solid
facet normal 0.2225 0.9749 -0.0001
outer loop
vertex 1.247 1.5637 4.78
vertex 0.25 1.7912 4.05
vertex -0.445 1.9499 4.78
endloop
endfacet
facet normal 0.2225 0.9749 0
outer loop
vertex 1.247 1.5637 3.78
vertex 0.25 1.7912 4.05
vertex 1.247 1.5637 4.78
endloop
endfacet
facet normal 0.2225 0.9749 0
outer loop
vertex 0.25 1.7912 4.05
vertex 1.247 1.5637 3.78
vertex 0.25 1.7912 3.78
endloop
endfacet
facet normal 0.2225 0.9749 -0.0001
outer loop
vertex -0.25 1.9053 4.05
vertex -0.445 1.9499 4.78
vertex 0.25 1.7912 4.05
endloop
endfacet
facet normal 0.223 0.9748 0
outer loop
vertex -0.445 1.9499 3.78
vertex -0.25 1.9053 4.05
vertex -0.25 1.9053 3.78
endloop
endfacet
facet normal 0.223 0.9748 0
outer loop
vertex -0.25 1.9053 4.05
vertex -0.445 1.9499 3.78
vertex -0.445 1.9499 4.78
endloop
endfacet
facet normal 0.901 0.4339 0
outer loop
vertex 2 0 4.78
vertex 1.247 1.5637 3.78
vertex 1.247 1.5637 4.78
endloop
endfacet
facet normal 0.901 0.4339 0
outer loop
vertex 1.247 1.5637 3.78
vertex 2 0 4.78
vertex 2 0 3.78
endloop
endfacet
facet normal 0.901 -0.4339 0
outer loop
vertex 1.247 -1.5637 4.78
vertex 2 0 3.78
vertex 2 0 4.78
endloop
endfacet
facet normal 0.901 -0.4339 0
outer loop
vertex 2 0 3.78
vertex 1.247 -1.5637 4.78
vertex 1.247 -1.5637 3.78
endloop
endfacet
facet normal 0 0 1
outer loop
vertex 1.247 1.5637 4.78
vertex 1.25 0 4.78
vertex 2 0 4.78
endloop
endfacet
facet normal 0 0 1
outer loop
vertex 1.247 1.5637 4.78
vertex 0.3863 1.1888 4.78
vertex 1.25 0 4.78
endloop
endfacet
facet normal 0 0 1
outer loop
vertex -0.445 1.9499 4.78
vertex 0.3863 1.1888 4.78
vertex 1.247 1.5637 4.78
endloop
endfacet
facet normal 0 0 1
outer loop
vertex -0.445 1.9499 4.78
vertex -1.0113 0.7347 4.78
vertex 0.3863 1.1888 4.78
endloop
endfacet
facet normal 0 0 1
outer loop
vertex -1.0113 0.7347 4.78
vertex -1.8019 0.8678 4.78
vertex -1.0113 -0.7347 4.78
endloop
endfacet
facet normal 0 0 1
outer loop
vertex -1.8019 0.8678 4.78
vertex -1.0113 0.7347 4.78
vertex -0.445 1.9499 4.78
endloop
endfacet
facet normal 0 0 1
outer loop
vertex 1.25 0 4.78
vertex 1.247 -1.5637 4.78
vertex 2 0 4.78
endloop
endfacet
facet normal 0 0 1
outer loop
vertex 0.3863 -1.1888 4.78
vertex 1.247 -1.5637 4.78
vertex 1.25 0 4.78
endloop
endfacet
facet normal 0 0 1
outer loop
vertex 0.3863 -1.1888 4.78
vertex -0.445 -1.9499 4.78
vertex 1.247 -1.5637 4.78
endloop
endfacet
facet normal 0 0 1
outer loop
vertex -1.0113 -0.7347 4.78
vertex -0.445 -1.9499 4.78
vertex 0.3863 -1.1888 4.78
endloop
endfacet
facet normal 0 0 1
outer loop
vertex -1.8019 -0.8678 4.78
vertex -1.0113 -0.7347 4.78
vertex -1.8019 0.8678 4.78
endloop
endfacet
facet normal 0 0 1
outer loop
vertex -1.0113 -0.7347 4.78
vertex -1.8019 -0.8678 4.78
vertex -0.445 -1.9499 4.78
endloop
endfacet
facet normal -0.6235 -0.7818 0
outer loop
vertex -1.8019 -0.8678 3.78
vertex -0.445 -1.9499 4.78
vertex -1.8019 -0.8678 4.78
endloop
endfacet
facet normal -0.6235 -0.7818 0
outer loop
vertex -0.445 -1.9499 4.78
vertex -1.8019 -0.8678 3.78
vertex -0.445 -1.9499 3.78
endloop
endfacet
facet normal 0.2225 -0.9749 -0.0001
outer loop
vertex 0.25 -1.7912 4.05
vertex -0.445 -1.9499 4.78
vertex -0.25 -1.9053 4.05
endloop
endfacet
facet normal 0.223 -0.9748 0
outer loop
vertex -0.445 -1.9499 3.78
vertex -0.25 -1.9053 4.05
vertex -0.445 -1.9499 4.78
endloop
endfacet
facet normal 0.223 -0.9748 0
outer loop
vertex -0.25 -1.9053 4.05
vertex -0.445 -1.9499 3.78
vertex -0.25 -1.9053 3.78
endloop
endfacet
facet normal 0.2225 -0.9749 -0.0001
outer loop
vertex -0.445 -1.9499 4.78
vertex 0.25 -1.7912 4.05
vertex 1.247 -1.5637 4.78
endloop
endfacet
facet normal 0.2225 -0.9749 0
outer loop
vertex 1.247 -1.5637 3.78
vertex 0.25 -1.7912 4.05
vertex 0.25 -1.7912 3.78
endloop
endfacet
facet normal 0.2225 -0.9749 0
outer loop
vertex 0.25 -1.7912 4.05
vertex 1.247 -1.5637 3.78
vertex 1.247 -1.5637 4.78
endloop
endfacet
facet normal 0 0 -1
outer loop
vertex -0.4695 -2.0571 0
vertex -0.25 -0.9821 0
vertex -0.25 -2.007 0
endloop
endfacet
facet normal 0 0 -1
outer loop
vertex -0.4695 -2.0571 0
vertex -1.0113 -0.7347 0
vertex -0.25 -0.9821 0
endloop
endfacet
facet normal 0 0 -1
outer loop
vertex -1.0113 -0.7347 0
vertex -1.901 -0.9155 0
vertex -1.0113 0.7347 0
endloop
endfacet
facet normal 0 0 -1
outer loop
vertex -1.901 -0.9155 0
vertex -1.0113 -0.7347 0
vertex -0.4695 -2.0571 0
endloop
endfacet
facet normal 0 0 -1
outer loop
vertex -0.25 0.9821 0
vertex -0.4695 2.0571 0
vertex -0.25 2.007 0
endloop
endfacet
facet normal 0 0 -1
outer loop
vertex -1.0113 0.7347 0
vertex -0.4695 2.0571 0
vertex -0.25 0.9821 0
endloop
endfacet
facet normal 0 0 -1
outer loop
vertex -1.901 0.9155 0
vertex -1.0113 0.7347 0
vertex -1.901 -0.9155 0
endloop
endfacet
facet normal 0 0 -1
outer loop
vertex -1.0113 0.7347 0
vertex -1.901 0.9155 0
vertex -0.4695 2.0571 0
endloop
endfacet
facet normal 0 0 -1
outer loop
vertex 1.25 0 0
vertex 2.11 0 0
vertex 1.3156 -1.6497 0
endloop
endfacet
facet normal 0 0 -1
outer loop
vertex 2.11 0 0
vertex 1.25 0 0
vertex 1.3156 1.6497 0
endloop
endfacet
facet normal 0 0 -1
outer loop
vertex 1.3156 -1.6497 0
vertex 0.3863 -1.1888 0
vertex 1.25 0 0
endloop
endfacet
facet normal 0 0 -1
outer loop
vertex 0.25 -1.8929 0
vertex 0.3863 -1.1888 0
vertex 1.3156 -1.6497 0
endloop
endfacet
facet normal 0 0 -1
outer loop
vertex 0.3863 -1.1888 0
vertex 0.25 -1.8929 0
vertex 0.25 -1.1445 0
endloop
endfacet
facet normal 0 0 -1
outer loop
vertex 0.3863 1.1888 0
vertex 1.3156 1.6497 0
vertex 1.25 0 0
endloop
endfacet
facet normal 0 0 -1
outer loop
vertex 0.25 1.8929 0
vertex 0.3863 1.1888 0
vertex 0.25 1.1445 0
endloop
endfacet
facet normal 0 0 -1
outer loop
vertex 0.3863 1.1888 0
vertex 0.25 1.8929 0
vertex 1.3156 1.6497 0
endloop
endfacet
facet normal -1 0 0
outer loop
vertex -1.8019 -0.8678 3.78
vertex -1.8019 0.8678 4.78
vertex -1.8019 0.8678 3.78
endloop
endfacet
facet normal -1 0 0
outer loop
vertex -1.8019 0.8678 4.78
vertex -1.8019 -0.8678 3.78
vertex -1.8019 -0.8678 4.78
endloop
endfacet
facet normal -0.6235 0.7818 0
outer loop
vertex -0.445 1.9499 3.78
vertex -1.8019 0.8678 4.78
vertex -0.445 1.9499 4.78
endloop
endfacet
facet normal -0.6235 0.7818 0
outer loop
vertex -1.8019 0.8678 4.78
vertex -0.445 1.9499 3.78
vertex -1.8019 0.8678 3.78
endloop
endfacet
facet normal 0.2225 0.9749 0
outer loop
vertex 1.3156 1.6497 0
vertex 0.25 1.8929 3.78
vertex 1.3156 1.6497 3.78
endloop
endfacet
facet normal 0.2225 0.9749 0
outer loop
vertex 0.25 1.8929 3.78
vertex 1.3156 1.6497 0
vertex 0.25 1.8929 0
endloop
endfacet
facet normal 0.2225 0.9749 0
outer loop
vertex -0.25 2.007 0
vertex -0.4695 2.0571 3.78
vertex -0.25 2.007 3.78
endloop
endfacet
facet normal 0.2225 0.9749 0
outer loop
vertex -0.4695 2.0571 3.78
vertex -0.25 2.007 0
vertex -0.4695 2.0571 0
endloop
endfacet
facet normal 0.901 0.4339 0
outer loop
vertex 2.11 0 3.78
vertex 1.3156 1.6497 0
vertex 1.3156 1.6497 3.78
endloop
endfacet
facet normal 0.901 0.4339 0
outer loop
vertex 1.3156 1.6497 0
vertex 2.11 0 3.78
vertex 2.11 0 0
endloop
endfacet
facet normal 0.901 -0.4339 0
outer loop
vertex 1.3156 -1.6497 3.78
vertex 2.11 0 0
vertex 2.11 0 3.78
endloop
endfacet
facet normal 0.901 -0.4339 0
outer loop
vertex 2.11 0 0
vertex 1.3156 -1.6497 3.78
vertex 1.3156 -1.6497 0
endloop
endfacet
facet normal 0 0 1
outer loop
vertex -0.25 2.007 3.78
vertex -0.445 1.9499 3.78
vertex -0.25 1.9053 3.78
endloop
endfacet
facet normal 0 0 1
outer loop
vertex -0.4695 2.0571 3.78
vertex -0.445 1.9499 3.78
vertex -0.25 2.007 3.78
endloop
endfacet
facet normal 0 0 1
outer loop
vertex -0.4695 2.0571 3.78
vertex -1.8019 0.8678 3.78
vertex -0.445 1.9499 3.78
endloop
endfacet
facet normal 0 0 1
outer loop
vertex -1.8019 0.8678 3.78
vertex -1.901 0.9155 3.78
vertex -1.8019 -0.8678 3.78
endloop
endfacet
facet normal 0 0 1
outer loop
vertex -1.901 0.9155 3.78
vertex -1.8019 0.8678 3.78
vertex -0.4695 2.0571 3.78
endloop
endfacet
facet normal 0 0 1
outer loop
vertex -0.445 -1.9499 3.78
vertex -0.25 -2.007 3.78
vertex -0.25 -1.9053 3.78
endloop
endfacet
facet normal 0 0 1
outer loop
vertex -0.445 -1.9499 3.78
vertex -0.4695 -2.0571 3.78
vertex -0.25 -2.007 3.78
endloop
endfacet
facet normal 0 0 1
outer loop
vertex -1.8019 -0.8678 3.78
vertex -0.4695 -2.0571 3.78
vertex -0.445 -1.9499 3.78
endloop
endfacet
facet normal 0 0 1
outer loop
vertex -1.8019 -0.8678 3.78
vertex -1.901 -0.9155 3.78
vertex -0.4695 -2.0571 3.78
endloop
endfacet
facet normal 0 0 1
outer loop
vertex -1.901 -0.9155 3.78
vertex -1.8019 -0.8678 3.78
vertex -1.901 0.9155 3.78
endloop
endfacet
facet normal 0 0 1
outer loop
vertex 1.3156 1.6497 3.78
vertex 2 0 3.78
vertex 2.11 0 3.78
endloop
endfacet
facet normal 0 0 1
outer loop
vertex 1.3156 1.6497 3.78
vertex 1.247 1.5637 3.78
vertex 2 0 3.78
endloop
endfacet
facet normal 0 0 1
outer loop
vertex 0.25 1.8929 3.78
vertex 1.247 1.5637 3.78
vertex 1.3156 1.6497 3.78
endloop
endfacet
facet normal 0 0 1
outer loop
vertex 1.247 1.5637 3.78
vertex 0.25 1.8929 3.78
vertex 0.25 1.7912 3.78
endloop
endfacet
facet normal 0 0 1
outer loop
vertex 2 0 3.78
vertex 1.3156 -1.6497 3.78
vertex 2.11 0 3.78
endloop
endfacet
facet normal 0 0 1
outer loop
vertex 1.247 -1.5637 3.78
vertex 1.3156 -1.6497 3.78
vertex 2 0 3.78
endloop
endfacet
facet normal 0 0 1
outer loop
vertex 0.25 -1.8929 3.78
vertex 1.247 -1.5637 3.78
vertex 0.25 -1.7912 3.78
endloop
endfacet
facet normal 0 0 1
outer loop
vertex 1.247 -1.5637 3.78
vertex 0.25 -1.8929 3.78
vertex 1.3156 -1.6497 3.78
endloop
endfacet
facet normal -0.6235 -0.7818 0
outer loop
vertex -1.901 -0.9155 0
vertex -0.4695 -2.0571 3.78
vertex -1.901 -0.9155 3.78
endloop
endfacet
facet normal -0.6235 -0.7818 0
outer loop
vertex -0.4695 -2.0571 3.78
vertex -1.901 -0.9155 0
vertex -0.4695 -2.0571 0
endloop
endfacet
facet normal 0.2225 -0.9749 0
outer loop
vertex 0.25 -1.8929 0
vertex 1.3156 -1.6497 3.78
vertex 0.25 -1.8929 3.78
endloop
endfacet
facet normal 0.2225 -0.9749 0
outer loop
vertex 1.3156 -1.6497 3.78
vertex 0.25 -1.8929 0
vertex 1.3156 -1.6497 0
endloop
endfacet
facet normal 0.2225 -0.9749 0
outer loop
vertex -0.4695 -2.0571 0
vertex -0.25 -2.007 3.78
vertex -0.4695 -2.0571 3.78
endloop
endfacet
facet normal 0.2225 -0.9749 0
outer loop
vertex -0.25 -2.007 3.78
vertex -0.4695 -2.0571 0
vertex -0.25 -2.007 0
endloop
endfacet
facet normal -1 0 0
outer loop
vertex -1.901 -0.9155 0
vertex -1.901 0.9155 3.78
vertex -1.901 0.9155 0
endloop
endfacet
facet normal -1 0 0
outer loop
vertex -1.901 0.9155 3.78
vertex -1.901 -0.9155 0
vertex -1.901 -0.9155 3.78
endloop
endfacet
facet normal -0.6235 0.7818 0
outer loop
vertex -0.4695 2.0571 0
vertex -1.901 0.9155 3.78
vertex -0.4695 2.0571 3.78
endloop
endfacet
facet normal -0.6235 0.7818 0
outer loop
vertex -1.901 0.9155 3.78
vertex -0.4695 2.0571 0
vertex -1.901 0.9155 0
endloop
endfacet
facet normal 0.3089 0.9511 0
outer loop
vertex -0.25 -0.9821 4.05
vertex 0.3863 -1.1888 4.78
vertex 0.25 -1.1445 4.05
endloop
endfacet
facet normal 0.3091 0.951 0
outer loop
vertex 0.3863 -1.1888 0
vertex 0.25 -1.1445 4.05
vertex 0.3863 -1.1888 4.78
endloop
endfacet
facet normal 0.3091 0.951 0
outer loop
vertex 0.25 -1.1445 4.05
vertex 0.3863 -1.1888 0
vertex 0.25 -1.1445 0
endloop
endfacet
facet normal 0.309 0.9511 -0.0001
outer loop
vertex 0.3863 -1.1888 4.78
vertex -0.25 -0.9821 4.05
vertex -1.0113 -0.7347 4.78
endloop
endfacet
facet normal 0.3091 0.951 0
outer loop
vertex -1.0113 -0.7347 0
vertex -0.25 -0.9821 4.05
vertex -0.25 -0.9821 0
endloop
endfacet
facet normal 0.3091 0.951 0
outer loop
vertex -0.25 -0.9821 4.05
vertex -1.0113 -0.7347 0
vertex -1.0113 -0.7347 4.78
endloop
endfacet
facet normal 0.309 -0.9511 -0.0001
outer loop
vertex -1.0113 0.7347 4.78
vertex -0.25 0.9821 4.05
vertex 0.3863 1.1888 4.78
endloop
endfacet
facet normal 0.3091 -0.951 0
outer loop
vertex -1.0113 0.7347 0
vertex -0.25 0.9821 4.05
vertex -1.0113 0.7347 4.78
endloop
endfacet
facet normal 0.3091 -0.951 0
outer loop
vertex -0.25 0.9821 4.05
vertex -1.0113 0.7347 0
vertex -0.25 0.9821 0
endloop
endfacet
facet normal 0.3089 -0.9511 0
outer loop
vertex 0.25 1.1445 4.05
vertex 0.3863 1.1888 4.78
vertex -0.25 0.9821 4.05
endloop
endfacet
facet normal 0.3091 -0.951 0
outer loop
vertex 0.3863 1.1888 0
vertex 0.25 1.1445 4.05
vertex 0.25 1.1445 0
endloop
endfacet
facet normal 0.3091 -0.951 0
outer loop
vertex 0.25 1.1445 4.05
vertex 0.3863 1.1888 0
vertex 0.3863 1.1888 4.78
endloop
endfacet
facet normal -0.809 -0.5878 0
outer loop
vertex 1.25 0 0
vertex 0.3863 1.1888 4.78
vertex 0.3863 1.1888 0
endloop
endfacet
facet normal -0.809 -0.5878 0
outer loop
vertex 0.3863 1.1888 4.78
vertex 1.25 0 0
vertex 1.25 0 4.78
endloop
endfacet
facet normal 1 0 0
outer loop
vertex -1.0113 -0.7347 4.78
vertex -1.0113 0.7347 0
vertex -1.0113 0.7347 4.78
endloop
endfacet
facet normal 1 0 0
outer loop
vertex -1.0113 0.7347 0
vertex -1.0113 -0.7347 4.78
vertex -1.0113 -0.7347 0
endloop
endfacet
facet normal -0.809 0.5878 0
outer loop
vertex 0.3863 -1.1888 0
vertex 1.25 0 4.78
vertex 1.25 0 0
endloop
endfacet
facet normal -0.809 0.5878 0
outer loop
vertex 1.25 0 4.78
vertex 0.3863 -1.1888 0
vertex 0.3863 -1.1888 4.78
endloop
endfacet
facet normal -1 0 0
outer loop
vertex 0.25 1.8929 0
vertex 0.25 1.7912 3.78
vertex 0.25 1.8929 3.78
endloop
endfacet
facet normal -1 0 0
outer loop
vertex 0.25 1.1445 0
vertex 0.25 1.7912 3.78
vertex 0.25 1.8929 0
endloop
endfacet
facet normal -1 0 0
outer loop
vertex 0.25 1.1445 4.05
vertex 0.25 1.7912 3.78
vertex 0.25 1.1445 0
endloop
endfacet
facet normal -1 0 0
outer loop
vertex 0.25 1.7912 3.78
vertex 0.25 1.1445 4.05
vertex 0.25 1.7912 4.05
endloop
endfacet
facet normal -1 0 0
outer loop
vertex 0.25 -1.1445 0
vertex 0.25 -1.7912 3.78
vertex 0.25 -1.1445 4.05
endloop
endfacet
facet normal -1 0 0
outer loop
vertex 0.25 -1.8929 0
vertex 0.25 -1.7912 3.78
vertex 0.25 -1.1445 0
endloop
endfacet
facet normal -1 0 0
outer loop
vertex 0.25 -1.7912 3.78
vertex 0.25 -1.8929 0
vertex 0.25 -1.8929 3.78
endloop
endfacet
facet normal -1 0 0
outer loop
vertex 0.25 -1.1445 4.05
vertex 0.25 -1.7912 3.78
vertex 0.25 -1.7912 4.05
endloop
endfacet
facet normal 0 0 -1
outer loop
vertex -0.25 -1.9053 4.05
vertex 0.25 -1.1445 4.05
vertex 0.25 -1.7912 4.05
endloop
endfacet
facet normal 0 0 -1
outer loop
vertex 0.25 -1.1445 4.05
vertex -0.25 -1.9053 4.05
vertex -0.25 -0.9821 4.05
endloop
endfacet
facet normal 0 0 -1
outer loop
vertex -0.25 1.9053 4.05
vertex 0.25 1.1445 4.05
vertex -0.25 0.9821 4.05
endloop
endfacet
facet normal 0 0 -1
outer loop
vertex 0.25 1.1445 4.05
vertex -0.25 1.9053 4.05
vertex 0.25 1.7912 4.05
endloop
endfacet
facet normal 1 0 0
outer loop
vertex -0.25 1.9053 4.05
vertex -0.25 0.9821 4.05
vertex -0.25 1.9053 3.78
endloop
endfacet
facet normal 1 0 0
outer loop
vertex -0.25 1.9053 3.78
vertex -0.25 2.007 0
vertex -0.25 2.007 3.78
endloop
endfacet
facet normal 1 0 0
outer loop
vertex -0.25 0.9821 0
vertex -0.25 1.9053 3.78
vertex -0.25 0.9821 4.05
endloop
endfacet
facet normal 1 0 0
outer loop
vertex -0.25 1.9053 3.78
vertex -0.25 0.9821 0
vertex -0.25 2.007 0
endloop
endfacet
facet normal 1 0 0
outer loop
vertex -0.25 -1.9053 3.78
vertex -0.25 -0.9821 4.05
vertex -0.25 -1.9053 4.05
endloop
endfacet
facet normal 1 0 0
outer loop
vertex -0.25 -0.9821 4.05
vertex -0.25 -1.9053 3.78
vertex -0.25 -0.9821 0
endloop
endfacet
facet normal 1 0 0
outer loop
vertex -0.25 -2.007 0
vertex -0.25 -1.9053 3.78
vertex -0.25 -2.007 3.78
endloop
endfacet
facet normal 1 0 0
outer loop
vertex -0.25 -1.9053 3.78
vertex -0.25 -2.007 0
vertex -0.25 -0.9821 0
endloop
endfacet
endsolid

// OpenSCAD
fudge=0.1;

M3Rivet();

module M3Rivet(){
  //RS Expansion insert 
  color("gold")
  
  difference(){
    union(){
      cylinder(h=4.78,d=4);
      cylinder(h=3.78,d=4.22);
    }
    translate([0,0,-fudge/2]) cylinder(h=4.78+fudge,d=2.5);
    translate([0,0,4/2]) cube([0.5,4.5,4+fudge],true);
  }
}
